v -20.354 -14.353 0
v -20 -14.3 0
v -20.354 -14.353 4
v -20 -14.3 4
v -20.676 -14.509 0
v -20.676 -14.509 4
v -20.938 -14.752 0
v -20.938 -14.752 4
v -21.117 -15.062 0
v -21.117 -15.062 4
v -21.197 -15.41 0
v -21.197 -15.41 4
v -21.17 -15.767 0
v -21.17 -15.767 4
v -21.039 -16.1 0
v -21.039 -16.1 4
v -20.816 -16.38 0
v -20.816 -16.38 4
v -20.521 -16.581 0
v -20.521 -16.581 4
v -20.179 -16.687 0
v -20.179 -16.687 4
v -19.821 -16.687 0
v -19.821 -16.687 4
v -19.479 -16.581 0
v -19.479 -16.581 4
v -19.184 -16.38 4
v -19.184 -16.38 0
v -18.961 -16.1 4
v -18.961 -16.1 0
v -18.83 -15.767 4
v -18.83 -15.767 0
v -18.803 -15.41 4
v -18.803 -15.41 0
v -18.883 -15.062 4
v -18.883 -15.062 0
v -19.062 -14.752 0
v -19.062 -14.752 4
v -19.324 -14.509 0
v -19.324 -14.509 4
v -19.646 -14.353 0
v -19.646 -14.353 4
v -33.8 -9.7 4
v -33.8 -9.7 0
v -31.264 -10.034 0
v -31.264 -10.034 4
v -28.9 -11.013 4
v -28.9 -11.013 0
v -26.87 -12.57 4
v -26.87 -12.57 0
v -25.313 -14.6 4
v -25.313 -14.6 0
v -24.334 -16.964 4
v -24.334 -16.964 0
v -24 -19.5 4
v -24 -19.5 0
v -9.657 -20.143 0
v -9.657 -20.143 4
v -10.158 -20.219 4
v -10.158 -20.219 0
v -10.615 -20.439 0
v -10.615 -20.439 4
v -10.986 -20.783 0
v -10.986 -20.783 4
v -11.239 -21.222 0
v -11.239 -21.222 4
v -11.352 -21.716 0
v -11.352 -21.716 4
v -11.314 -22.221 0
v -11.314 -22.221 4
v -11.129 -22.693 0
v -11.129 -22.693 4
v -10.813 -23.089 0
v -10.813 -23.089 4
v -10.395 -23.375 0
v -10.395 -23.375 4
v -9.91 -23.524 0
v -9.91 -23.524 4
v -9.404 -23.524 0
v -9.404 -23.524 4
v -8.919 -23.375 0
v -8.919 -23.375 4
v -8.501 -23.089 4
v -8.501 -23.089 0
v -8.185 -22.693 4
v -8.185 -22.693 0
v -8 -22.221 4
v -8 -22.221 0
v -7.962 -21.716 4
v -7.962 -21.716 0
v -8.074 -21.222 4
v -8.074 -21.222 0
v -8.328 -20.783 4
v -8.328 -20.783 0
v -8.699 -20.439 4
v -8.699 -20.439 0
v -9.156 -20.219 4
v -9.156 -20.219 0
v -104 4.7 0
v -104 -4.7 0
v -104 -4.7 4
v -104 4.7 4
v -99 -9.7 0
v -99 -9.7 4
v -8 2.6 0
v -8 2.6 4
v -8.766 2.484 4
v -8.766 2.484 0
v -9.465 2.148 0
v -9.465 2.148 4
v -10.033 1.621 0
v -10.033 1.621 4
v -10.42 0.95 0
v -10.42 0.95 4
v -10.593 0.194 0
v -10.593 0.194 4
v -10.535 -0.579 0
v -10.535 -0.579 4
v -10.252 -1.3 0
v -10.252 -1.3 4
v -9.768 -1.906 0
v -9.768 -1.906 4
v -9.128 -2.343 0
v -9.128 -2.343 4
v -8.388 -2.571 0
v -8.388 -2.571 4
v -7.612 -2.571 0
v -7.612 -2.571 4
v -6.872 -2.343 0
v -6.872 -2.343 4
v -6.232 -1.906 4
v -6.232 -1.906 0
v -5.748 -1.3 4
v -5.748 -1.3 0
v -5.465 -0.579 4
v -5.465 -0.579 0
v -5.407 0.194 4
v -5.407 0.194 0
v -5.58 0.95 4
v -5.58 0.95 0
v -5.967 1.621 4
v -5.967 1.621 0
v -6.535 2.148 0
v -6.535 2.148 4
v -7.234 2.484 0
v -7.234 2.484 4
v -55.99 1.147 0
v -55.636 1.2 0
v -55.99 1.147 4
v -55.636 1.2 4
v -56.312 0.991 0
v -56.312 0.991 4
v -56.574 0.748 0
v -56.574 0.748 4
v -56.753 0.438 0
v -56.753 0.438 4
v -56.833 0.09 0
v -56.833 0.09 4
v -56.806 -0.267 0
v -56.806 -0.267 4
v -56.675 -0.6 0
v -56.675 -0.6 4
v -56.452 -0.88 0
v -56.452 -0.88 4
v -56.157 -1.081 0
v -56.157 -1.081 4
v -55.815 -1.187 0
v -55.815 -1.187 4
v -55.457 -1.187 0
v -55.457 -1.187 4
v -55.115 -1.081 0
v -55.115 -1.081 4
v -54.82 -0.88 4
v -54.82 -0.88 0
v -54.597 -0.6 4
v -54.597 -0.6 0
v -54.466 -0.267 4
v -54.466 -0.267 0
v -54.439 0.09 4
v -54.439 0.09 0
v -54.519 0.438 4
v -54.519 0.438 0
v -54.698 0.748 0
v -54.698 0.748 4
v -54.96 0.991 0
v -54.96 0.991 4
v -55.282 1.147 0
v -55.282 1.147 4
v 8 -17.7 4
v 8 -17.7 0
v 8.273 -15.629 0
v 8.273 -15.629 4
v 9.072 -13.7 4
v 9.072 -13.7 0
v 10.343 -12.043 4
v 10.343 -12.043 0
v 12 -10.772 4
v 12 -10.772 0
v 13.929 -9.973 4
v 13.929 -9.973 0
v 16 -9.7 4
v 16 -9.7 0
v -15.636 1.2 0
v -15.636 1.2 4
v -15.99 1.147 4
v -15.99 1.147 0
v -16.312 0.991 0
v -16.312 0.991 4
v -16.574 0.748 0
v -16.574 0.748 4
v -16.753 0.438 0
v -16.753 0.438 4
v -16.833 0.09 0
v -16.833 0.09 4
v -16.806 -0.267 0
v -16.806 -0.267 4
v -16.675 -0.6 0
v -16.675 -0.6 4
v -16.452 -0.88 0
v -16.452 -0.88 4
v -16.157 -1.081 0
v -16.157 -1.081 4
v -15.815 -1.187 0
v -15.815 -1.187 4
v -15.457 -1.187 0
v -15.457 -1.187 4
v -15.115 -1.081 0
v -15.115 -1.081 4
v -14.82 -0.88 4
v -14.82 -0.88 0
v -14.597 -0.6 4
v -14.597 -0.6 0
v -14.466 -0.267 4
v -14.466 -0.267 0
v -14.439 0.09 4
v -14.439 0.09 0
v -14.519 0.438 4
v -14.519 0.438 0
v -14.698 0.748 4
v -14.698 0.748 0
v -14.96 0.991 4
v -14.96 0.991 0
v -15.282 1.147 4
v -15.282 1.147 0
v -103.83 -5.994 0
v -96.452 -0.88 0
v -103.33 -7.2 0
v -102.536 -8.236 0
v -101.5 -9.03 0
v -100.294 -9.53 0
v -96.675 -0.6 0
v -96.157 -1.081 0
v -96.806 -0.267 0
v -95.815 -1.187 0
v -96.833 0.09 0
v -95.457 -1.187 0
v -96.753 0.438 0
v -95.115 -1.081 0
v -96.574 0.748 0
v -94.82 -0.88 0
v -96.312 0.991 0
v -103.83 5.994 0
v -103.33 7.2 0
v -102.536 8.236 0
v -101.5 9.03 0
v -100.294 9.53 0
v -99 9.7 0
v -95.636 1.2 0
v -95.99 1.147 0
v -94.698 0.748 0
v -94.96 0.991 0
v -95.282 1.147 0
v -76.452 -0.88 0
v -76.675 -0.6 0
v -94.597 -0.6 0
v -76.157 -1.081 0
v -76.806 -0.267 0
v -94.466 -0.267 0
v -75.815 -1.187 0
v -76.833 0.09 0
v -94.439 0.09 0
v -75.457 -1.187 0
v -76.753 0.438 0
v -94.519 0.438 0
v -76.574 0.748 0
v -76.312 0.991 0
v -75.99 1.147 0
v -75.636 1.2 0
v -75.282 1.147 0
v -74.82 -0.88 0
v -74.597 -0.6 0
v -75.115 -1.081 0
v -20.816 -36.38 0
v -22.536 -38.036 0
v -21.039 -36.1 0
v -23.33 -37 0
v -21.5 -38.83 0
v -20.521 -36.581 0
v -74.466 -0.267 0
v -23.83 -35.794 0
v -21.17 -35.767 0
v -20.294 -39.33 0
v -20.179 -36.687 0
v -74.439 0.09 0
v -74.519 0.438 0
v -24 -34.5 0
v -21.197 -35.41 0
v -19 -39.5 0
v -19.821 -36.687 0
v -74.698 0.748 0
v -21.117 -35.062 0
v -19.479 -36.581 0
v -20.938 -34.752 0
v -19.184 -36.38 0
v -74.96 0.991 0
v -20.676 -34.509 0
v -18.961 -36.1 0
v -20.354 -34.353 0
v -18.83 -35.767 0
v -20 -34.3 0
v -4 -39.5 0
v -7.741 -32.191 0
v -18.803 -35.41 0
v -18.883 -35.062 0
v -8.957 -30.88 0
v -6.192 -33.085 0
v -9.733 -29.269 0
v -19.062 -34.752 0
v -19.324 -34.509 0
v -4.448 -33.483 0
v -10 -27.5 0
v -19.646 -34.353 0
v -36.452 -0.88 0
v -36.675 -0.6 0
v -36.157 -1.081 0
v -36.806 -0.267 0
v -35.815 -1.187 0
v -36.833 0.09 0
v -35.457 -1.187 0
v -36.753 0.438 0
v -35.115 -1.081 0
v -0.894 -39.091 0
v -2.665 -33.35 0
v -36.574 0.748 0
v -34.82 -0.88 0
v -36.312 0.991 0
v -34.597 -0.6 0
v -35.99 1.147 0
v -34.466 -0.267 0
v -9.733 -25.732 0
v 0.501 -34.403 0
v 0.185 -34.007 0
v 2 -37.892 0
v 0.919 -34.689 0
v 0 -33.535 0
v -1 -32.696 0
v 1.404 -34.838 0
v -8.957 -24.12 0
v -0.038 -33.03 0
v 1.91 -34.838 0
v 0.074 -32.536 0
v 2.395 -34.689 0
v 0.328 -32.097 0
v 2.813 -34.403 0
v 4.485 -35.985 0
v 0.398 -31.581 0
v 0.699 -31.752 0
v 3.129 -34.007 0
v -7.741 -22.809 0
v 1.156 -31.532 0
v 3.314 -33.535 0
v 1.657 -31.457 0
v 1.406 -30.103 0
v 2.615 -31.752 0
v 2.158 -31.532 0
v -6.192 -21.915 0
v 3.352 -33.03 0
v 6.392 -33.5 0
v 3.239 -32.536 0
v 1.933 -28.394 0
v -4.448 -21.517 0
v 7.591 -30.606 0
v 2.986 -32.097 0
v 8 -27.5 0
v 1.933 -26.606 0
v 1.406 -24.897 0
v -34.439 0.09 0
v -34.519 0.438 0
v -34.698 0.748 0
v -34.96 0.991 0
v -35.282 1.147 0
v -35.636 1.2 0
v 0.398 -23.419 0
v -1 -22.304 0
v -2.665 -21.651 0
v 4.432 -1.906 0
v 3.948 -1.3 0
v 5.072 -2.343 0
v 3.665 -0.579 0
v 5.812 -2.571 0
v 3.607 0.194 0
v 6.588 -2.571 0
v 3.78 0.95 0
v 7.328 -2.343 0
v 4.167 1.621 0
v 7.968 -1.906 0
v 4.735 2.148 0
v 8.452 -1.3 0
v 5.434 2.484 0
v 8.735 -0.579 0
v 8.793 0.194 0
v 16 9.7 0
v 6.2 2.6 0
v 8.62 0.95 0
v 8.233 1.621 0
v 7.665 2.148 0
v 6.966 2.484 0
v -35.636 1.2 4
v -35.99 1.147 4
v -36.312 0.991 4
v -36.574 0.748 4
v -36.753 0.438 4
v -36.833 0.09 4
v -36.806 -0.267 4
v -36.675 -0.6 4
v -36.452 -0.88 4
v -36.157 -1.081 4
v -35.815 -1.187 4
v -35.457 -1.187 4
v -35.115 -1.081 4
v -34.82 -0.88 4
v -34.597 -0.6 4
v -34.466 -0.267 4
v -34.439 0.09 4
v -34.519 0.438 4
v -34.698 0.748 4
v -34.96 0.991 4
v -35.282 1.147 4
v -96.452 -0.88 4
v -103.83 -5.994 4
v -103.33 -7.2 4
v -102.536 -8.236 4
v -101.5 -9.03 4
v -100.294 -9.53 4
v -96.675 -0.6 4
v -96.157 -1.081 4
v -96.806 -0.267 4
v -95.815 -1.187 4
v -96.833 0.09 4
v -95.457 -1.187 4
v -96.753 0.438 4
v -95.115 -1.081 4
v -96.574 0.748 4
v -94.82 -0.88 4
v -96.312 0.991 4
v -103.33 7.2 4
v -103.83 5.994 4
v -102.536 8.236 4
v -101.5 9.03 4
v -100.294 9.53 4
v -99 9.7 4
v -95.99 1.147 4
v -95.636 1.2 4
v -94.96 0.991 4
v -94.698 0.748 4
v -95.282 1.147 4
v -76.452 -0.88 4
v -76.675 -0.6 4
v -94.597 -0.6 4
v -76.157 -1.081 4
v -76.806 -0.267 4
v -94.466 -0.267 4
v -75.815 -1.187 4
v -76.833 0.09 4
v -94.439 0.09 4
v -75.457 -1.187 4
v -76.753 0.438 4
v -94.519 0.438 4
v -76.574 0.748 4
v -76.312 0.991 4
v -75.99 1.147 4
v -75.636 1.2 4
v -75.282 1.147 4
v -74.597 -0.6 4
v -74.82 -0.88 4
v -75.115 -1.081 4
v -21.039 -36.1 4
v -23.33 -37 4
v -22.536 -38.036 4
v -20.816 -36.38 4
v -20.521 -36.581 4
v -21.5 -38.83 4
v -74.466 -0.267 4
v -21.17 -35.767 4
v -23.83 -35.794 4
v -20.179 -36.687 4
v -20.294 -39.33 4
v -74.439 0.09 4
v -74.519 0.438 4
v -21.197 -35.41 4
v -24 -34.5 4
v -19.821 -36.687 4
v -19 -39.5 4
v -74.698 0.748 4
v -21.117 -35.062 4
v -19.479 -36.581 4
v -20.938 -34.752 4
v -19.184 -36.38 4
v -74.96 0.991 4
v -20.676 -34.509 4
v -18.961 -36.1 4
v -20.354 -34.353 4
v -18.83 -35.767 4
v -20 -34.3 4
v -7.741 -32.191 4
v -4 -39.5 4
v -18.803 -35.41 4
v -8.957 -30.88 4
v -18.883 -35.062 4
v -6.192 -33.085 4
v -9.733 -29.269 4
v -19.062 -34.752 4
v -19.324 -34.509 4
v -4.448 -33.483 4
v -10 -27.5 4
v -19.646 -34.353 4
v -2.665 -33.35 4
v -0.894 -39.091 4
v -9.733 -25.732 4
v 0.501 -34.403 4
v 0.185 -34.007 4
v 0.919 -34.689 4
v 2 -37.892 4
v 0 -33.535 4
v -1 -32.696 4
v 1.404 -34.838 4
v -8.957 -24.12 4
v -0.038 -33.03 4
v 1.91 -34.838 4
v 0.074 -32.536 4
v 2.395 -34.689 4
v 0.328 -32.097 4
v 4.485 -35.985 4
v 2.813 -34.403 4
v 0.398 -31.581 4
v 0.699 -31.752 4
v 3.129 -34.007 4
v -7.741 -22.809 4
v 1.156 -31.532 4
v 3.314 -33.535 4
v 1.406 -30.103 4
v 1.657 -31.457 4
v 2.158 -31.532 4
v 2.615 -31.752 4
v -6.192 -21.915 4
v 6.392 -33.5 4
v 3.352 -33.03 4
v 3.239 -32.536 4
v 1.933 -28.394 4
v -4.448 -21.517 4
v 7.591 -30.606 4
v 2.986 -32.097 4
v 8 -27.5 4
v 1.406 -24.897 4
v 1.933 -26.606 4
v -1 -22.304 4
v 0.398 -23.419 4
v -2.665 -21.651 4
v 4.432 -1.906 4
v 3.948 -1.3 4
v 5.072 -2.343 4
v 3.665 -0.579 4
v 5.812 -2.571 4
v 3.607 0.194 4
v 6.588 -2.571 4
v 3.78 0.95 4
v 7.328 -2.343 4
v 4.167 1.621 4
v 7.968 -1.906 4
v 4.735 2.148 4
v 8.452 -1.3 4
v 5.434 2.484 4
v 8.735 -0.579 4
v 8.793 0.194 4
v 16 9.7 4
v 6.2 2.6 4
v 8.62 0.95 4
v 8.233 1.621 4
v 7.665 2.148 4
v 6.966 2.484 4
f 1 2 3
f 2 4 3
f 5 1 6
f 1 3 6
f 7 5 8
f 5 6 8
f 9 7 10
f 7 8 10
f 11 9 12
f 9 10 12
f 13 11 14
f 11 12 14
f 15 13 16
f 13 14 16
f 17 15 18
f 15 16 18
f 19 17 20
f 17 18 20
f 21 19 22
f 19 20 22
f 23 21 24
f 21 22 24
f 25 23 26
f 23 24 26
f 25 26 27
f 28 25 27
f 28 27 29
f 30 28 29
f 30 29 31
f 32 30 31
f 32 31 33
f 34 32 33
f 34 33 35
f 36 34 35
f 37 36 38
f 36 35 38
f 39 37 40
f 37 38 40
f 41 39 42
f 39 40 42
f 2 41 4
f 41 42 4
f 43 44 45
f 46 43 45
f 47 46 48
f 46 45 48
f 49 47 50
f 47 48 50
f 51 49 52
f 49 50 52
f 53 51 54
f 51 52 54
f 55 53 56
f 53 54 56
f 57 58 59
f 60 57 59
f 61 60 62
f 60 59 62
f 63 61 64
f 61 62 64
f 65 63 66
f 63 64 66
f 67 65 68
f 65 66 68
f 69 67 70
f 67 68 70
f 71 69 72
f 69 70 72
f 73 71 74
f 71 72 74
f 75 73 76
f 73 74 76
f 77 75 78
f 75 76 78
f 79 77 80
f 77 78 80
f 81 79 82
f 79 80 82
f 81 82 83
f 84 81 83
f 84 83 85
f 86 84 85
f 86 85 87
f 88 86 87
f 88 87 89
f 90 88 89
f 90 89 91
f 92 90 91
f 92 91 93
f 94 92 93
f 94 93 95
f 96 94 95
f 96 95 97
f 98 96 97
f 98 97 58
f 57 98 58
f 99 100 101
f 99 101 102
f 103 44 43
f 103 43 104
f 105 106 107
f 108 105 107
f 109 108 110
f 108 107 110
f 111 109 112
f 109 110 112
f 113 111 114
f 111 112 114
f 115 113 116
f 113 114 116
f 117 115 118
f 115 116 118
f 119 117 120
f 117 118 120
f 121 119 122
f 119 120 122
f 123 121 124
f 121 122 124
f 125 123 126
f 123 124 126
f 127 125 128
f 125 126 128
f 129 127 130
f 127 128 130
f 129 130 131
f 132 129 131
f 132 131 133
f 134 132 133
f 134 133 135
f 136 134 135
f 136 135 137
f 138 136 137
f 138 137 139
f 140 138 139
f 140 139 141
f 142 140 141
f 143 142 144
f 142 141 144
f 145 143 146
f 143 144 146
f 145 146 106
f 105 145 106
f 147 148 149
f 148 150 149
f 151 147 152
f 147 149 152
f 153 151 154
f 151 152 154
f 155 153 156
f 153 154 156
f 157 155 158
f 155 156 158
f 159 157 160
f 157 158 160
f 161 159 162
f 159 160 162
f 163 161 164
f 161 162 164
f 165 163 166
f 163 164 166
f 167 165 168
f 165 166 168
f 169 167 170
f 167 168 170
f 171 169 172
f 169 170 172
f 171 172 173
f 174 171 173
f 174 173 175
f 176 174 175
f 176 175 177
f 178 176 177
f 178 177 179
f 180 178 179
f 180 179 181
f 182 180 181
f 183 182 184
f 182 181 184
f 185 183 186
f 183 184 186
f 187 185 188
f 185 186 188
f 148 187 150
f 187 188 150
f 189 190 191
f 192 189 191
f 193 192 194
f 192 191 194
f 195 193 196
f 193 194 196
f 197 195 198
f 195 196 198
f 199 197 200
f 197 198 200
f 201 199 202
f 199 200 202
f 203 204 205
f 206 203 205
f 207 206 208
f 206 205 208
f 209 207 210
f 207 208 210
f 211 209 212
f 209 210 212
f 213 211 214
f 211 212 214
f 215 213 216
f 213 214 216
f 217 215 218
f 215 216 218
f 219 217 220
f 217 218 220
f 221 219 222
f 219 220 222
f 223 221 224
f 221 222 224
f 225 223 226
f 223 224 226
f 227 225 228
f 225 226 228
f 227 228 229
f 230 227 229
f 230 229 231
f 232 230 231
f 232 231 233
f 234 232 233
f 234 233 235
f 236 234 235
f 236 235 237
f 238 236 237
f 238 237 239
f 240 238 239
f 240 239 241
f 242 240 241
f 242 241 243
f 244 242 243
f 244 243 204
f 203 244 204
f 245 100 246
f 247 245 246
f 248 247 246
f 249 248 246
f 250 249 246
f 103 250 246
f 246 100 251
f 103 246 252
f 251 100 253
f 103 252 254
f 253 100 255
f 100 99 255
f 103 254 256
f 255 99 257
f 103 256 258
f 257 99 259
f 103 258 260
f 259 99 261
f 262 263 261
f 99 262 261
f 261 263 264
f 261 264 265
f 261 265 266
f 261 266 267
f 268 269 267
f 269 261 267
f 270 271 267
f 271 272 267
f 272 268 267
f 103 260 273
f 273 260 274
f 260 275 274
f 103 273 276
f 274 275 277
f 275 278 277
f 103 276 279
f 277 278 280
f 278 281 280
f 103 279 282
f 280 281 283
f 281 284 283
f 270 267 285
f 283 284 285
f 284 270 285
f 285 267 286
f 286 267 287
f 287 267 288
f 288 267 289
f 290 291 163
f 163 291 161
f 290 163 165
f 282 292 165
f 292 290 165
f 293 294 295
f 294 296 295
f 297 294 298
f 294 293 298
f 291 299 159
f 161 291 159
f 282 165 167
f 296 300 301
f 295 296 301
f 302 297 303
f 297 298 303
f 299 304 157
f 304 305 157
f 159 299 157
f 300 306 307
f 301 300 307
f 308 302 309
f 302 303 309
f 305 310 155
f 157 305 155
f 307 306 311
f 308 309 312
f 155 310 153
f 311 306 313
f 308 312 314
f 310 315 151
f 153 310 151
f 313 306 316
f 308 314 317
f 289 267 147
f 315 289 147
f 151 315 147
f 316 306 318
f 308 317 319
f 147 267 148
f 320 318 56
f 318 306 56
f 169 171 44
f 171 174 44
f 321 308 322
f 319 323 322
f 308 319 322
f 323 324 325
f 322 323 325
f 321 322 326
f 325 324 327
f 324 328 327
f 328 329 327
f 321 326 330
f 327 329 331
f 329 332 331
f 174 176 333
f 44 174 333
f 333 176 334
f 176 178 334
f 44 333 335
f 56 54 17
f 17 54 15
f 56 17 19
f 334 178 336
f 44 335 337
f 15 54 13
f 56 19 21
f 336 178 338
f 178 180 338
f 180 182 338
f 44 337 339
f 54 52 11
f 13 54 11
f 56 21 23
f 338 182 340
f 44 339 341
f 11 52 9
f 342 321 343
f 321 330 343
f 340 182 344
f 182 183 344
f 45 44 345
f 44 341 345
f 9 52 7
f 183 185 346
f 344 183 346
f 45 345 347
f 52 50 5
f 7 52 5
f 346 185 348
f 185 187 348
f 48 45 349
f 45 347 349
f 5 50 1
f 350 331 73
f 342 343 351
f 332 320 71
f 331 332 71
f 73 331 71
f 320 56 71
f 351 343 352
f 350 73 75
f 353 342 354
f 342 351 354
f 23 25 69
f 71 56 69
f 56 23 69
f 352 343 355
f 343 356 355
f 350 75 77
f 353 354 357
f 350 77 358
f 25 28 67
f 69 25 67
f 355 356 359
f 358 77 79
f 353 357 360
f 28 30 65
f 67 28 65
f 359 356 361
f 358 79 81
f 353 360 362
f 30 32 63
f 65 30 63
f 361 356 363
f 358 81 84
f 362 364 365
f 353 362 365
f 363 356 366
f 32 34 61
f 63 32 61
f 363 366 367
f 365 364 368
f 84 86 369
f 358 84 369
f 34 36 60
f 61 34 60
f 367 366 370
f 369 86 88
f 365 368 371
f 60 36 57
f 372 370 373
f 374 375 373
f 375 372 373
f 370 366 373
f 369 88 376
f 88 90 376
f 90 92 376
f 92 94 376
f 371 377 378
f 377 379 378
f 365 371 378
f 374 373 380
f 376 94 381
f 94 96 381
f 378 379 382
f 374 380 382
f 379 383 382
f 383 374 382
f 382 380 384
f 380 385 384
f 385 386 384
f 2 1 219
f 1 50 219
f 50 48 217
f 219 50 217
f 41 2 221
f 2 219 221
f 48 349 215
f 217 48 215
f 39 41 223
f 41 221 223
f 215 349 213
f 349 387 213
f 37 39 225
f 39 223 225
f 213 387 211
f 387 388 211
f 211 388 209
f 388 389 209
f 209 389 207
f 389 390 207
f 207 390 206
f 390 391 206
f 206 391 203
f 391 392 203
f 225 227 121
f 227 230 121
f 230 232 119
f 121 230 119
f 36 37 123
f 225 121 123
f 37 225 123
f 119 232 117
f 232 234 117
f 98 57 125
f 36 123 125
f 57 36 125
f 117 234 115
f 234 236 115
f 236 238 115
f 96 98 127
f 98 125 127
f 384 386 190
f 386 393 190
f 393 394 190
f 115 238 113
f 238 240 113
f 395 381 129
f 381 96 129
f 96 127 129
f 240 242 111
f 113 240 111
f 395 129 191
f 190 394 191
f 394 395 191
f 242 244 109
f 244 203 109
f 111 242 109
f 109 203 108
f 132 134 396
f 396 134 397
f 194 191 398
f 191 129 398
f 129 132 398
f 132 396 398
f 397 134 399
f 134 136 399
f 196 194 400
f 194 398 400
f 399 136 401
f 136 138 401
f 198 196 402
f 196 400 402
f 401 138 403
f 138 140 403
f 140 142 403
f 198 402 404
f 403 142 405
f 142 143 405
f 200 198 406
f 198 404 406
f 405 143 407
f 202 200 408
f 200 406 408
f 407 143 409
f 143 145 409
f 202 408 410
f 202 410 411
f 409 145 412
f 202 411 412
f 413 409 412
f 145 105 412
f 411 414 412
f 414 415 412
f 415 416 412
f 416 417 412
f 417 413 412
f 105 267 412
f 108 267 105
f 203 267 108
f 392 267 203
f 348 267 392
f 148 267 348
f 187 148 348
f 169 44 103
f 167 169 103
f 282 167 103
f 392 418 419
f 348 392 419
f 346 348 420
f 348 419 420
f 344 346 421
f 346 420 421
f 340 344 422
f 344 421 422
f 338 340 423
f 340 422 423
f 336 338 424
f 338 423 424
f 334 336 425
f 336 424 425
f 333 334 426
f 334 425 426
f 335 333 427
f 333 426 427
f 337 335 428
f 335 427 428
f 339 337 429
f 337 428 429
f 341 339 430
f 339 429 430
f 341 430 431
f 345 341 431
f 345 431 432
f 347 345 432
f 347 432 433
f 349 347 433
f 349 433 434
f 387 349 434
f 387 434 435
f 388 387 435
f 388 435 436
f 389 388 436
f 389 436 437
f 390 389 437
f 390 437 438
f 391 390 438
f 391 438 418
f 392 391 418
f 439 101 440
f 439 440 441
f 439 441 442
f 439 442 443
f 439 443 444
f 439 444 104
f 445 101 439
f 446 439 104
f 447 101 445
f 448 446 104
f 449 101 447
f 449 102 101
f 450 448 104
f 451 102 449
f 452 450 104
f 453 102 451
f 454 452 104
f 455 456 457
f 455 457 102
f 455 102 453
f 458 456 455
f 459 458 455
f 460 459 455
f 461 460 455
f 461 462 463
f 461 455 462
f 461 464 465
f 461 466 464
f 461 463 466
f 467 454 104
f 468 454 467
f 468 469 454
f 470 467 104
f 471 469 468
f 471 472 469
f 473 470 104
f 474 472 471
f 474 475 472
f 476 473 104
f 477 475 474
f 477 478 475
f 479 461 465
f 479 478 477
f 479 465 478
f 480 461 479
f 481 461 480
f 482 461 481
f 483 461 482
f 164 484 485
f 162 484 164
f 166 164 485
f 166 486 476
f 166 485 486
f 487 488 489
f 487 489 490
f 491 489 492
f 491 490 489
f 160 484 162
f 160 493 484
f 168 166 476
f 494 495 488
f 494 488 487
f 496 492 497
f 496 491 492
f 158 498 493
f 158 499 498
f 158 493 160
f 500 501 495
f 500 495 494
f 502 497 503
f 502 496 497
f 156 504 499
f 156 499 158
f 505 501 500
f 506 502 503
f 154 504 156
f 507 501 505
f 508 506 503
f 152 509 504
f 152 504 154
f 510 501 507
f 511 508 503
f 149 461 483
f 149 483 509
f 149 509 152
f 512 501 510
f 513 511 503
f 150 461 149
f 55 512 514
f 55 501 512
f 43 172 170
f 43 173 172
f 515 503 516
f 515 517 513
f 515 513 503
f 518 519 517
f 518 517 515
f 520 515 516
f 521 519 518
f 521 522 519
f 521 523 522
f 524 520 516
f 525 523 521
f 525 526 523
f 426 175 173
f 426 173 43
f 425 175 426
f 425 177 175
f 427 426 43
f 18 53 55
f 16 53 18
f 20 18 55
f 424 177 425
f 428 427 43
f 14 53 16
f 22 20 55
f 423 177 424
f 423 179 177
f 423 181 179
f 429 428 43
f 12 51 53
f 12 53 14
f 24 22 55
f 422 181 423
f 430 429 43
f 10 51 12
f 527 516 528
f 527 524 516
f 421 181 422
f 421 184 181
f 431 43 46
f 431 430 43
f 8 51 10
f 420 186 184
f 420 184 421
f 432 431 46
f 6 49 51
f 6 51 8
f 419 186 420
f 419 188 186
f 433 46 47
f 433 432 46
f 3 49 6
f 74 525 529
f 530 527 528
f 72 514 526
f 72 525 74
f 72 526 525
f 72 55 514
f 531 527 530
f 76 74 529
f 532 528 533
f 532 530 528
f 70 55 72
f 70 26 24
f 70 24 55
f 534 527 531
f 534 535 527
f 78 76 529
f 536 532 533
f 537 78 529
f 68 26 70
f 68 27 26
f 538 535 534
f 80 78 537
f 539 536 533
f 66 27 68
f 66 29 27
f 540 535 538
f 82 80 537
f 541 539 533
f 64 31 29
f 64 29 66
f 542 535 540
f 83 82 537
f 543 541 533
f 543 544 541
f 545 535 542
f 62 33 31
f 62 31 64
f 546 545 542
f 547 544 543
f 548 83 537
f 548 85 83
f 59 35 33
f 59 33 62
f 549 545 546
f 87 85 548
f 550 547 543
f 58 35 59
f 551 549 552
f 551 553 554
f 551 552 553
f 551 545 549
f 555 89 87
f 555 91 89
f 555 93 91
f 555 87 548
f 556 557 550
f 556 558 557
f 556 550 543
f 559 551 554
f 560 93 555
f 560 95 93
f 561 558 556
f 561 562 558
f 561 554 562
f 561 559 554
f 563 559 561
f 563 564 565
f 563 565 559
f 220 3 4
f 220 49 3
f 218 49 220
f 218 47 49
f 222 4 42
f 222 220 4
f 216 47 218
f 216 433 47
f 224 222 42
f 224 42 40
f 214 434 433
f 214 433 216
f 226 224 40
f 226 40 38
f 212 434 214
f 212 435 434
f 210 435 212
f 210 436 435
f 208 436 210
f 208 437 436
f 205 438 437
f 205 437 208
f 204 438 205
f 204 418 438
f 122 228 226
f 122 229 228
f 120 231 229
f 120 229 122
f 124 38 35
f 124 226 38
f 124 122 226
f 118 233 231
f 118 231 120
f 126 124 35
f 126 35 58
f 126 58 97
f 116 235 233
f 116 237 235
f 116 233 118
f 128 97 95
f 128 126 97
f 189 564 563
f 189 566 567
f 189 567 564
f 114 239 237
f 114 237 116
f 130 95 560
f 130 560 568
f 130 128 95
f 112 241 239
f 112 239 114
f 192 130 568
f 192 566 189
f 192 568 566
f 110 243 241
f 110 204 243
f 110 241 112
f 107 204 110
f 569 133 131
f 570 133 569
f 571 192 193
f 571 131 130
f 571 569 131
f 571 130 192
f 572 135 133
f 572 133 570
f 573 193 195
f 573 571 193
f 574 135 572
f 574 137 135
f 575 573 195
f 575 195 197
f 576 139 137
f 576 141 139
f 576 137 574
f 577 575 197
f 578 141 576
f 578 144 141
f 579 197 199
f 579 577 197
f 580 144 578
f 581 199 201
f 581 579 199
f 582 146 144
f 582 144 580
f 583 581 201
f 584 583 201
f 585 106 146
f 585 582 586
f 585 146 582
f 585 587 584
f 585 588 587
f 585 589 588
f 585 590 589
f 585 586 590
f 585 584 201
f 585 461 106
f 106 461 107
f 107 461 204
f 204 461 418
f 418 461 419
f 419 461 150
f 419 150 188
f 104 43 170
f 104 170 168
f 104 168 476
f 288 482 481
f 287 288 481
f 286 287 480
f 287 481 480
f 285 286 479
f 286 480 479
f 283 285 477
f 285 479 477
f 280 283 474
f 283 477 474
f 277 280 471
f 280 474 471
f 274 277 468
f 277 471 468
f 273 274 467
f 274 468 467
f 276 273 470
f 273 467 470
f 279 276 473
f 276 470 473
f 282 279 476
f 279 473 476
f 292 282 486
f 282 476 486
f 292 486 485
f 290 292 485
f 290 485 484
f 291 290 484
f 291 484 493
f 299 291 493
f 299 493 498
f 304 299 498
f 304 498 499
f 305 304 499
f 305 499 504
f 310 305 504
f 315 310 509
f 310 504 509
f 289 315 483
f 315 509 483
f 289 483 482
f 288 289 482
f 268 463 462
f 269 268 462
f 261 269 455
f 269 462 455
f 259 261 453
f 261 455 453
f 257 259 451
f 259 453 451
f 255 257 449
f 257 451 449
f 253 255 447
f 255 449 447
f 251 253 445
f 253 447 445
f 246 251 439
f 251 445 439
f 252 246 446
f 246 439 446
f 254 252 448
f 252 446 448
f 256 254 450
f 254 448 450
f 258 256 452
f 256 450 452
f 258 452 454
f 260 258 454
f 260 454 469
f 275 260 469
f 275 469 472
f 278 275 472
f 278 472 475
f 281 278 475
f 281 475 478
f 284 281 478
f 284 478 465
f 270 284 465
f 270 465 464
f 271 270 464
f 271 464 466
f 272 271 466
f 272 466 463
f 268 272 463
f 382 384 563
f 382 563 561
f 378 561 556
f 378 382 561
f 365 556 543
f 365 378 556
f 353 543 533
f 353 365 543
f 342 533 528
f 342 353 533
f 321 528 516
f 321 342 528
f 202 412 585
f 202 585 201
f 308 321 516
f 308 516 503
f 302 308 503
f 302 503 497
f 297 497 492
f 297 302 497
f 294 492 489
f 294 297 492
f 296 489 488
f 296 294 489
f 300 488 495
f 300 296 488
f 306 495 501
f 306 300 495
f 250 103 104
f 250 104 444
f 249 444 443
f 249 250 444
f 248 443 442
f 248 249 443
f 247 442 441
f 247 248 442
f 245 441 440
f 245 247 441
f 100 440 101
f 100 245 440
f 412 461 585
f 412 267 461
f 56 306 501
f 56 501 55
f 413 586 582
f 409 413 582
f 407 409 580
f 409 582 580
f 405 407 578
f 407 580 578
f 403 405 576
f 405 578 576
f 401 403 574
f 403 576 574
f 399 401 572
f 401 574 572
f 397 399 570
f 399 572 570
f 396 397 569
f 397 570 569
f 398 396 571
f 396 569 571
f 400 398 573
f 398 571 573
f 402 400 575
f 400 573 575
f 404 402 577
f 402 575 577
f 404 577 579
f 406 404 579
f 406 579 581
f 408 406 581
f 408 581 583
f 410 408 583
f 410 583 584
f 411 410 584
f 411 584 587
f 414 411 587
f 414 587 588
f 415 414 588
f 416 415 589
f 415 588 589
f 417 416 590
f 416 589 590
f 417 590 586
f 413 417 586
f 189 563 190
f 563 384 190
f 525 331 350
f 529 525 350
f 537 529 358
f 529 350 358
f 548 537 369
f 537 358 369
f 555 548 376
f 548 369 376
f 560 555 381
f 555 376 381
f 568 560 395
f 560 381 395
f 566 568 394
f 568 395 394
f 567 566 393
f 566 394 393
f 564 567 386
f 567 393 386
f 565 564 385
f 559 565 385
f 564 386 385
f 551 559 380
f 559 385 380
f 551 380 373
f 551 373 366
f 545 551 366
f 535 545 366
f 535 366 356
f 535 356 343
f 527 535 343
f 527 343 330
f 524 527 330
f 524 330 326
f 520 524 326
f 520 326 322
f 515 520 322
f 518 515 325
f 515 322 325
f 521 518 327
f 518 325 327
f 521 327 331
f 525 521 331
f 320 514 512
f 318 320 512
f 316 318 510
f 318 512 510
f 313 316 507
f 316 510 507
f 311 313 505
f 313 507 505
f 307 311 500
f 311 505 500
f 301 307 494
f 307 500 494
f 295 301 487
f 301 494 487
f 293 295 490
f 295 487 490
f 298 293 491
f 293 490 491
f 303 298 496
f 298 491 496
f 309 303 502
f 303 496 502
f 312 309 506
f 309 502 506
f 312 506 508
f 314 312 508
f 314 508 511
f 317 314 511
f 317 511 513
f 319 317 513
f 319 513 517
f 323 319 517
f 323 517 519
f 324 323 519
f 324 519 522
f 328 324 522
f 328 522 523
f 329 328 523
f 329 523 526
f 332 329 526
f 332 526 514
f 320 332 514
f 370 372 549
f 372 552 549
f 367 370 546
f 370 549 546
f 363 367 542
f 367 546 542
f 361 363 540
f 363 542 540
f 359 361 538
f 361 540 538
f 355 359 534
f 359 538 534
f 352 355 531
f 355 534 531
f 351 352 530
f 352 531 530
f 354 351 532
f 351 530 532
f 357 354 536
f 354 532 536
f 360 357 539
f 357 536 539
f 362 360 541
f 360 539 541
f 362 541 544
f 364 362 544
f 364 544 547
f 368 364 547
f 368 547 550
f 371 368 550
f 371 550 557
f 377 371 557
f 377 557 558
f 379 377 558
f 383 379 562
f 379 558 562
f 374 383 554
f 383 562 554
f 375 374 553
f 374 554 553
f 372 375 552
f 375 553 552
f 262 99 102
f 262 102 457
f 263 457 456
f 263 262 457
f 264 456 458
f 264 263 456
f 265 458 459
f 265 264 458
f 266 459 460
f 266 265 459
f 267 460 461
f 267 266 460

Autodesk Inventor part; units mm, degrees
ref_plane "YZ Plane" through (0, 0, 0) normal (1, 0, 0) x (0, 1, 0)
ref_plane "XZ Plane" through (0, 0, 0) normal (0, 1, 0) x (-1, 0, 0)
ref_plane "XY Plane" through (0, 0, 0) normal (0, 0, 1) x (1, 0, 0)
sketch "Sketch1" plane through (0, 0, 0) normal (0, 0, 1) x (1, 0, 0)
  circle A0 centre (8, 0) radius 2.6 projected
  circle A1 centre (-2, 0) radius 2.6 projected
  circle A2 centre (-12, 0) radius 2.6 projected
  line L0 (16, 9.7) -> (16, -9.7) projected
  line L1 (16, -9.7) -> (-16, -9.7) projected
  line L2 (-16, -9.7) -> (-16, 9.7) projected
  line L3 (-16, 9.7) -> (16, 9.7) projected
  circle A3 centre (-12, 0) radius 2.6 projected
  circle A4 centre (-2, 0) radius 2.6 projected
  circle A5 centre (8, 0) radius 2.6 projected
  line L4 (16, -9.7) -> (-104, -9.7)
  line L5 (-104, -9.7) -> (-104, 9.7)
  line L6 (-104, 9.7) -> (16, 9.7)
  line L7 (16, 9.7) -> (16, -9.7)
  circle A6 centre (-99, -4.7) radius 5
  line L8 (-136.5, 4.5) -> (-136.5, -4.5)
  circle A7 centre (-99, 4.7) radius 5
  point P0 (0, 0)
  point P1 (-126.8, 9.7)
  point P2 (-99, -9.7)
  point P3 (-16, -9.7)
  point P4 (-16, -9.7)
  point P5 (-104, -4.7)
  point P6 (-99, 9.7)
  point P7 (-104, 4.7)
  dimension "d0" = 120
  dimension "d1" = 19.4
  dimension "d18" = 10
extrude "Extrusion1" add sketch "Sketch1" along normal blind 4 contours A0 | A1 | A2 | L0 L1 L2 L3 | L2 L4 A6 A7 L6 | A7 A6 | A6 A7 | A7 A6 L5 | A7 A6
sketch "Sketch11" plane through (0, 0, 0) normal (0, 0, -1) x (-1, 0, 0)
  circle A0 centre (-6.2, 0) radius 5
  line L0 (15, -9.7) -> (15, 9.7) projected
  circle A1 centre (8, 0) radius 5
  line L1 (-16, -9.7) -> (-16, 9.7) projected
  point P0 (0, 0)
  dimension "d109" = 10
  dimension "d110" = 10
  dimension "d111" = 9.8
  dimension "d112" = 7
hole "Hole7" at (6.2, 0, 0) at (-8, 0, 0) direction (0, 0, 1) diameter 5.2 depth 5.5
sketch "Sketch12" plane through (0, 0, 0) normal (0, 0, -1) x (-1, 0, 0)
  circle A0 centre (15.636, 0) radius 1.75 projected
  circle A1 centre (35.636, 0) radius 1.75 projected
  circle A2 centre (55.636, 0) radius 1.75 projected
  circle A3 centre (75.636, 0) radius 1.75 projected
  circle A4 centre (95.636, 0) radius 1.75 projected
  point P0 (0, 0)
hole "Hole8" at (-15.636, 0, 0) at (-35.636, 0, 0) at (-55.636, 0, 0) at (-75.636, 0, 0) at (-95.636, 0, 0) direction (0, 0, 1) diameter 2.4 depth 5.5
sketch "Sketch13" plane through (0, 0, 0) normal (0, 0, -1) x (-1, 0, 0)
  circle A0 centre (4, -27.5001) radius 5.25 projected
  circle A1 centre (4, -27.5001) radius 12
  line L0 (-8, -27.5001) -> (-8, -17.7)
  line L1 (99, -9.7) -> (-16, -9.7) projected
  arc A2 (-8, -17.7) -> (-16, -9.7) centre (-16, -17.7) ccw
  line L2 (4, -39.5001) -> (19, -39.5001)
  arc A3 (19, -39.5001) -> (24, -34.5001) centre (19, -34.5001) ccw
  line L3 (19, -39.5001) -> (19, -34.5001) construction
  line L4 (24, -34.5001) -> (19, -34.5001) construction
  line L5 (24, -34.5001) -> (24, -19.5001)
  arc A4 (33.8001, -9.7) -> (24, -19.5001) centre (33.8001, -19.5001) ccw
  line L6 (-1.6569, -33.1569) -> (9.6569, -21.8432)
  circle A5 centre (4, -27.5001) radius 6
  point P0 (0, 0)
  dimension "d127" = 24
  dimension "d129" = 15
  dimension "d130" = 5
  dimension "d131" = 90
  dimension "d132" = 15
  dimension "d133" = 45
  dimension "d134" = 8
  dimension "d135" = 8
  dimension "d145" = 12
extrude "Extrusion5" add sketch "Sketch13" against normal blind 4
hole "Hole9" at (1.6569, -33.1569, 0) at (-9.6569, -21.8432, 0) direction (0, 0, 1) diameter 3.4 depth 5.5
sketch "Sketch14" plane through (0, 0, 0) normal (0, 0, -1) x (-1, 0, 0)
  line L0 (24, -34.5001) -> (24, -19.5001) projected
  line L1 (4, -39.5001) -> (19, -39.5001) projected
  point P0 (0, 0)
  point P1 (20, -35.5001)
  point P2 (20, -15.5001)
  dimension "d146" = 4
  dimension "d147" = 4
  dimension "d148" = 20
hole "Hole10" at (-20, -35.5001, 0) at (-20, -15.5001, 0) direction (0, 0, 1) diameter 2.4 depth 5.5
equation "\"d135\" = d134"
properties part number "back z support"
